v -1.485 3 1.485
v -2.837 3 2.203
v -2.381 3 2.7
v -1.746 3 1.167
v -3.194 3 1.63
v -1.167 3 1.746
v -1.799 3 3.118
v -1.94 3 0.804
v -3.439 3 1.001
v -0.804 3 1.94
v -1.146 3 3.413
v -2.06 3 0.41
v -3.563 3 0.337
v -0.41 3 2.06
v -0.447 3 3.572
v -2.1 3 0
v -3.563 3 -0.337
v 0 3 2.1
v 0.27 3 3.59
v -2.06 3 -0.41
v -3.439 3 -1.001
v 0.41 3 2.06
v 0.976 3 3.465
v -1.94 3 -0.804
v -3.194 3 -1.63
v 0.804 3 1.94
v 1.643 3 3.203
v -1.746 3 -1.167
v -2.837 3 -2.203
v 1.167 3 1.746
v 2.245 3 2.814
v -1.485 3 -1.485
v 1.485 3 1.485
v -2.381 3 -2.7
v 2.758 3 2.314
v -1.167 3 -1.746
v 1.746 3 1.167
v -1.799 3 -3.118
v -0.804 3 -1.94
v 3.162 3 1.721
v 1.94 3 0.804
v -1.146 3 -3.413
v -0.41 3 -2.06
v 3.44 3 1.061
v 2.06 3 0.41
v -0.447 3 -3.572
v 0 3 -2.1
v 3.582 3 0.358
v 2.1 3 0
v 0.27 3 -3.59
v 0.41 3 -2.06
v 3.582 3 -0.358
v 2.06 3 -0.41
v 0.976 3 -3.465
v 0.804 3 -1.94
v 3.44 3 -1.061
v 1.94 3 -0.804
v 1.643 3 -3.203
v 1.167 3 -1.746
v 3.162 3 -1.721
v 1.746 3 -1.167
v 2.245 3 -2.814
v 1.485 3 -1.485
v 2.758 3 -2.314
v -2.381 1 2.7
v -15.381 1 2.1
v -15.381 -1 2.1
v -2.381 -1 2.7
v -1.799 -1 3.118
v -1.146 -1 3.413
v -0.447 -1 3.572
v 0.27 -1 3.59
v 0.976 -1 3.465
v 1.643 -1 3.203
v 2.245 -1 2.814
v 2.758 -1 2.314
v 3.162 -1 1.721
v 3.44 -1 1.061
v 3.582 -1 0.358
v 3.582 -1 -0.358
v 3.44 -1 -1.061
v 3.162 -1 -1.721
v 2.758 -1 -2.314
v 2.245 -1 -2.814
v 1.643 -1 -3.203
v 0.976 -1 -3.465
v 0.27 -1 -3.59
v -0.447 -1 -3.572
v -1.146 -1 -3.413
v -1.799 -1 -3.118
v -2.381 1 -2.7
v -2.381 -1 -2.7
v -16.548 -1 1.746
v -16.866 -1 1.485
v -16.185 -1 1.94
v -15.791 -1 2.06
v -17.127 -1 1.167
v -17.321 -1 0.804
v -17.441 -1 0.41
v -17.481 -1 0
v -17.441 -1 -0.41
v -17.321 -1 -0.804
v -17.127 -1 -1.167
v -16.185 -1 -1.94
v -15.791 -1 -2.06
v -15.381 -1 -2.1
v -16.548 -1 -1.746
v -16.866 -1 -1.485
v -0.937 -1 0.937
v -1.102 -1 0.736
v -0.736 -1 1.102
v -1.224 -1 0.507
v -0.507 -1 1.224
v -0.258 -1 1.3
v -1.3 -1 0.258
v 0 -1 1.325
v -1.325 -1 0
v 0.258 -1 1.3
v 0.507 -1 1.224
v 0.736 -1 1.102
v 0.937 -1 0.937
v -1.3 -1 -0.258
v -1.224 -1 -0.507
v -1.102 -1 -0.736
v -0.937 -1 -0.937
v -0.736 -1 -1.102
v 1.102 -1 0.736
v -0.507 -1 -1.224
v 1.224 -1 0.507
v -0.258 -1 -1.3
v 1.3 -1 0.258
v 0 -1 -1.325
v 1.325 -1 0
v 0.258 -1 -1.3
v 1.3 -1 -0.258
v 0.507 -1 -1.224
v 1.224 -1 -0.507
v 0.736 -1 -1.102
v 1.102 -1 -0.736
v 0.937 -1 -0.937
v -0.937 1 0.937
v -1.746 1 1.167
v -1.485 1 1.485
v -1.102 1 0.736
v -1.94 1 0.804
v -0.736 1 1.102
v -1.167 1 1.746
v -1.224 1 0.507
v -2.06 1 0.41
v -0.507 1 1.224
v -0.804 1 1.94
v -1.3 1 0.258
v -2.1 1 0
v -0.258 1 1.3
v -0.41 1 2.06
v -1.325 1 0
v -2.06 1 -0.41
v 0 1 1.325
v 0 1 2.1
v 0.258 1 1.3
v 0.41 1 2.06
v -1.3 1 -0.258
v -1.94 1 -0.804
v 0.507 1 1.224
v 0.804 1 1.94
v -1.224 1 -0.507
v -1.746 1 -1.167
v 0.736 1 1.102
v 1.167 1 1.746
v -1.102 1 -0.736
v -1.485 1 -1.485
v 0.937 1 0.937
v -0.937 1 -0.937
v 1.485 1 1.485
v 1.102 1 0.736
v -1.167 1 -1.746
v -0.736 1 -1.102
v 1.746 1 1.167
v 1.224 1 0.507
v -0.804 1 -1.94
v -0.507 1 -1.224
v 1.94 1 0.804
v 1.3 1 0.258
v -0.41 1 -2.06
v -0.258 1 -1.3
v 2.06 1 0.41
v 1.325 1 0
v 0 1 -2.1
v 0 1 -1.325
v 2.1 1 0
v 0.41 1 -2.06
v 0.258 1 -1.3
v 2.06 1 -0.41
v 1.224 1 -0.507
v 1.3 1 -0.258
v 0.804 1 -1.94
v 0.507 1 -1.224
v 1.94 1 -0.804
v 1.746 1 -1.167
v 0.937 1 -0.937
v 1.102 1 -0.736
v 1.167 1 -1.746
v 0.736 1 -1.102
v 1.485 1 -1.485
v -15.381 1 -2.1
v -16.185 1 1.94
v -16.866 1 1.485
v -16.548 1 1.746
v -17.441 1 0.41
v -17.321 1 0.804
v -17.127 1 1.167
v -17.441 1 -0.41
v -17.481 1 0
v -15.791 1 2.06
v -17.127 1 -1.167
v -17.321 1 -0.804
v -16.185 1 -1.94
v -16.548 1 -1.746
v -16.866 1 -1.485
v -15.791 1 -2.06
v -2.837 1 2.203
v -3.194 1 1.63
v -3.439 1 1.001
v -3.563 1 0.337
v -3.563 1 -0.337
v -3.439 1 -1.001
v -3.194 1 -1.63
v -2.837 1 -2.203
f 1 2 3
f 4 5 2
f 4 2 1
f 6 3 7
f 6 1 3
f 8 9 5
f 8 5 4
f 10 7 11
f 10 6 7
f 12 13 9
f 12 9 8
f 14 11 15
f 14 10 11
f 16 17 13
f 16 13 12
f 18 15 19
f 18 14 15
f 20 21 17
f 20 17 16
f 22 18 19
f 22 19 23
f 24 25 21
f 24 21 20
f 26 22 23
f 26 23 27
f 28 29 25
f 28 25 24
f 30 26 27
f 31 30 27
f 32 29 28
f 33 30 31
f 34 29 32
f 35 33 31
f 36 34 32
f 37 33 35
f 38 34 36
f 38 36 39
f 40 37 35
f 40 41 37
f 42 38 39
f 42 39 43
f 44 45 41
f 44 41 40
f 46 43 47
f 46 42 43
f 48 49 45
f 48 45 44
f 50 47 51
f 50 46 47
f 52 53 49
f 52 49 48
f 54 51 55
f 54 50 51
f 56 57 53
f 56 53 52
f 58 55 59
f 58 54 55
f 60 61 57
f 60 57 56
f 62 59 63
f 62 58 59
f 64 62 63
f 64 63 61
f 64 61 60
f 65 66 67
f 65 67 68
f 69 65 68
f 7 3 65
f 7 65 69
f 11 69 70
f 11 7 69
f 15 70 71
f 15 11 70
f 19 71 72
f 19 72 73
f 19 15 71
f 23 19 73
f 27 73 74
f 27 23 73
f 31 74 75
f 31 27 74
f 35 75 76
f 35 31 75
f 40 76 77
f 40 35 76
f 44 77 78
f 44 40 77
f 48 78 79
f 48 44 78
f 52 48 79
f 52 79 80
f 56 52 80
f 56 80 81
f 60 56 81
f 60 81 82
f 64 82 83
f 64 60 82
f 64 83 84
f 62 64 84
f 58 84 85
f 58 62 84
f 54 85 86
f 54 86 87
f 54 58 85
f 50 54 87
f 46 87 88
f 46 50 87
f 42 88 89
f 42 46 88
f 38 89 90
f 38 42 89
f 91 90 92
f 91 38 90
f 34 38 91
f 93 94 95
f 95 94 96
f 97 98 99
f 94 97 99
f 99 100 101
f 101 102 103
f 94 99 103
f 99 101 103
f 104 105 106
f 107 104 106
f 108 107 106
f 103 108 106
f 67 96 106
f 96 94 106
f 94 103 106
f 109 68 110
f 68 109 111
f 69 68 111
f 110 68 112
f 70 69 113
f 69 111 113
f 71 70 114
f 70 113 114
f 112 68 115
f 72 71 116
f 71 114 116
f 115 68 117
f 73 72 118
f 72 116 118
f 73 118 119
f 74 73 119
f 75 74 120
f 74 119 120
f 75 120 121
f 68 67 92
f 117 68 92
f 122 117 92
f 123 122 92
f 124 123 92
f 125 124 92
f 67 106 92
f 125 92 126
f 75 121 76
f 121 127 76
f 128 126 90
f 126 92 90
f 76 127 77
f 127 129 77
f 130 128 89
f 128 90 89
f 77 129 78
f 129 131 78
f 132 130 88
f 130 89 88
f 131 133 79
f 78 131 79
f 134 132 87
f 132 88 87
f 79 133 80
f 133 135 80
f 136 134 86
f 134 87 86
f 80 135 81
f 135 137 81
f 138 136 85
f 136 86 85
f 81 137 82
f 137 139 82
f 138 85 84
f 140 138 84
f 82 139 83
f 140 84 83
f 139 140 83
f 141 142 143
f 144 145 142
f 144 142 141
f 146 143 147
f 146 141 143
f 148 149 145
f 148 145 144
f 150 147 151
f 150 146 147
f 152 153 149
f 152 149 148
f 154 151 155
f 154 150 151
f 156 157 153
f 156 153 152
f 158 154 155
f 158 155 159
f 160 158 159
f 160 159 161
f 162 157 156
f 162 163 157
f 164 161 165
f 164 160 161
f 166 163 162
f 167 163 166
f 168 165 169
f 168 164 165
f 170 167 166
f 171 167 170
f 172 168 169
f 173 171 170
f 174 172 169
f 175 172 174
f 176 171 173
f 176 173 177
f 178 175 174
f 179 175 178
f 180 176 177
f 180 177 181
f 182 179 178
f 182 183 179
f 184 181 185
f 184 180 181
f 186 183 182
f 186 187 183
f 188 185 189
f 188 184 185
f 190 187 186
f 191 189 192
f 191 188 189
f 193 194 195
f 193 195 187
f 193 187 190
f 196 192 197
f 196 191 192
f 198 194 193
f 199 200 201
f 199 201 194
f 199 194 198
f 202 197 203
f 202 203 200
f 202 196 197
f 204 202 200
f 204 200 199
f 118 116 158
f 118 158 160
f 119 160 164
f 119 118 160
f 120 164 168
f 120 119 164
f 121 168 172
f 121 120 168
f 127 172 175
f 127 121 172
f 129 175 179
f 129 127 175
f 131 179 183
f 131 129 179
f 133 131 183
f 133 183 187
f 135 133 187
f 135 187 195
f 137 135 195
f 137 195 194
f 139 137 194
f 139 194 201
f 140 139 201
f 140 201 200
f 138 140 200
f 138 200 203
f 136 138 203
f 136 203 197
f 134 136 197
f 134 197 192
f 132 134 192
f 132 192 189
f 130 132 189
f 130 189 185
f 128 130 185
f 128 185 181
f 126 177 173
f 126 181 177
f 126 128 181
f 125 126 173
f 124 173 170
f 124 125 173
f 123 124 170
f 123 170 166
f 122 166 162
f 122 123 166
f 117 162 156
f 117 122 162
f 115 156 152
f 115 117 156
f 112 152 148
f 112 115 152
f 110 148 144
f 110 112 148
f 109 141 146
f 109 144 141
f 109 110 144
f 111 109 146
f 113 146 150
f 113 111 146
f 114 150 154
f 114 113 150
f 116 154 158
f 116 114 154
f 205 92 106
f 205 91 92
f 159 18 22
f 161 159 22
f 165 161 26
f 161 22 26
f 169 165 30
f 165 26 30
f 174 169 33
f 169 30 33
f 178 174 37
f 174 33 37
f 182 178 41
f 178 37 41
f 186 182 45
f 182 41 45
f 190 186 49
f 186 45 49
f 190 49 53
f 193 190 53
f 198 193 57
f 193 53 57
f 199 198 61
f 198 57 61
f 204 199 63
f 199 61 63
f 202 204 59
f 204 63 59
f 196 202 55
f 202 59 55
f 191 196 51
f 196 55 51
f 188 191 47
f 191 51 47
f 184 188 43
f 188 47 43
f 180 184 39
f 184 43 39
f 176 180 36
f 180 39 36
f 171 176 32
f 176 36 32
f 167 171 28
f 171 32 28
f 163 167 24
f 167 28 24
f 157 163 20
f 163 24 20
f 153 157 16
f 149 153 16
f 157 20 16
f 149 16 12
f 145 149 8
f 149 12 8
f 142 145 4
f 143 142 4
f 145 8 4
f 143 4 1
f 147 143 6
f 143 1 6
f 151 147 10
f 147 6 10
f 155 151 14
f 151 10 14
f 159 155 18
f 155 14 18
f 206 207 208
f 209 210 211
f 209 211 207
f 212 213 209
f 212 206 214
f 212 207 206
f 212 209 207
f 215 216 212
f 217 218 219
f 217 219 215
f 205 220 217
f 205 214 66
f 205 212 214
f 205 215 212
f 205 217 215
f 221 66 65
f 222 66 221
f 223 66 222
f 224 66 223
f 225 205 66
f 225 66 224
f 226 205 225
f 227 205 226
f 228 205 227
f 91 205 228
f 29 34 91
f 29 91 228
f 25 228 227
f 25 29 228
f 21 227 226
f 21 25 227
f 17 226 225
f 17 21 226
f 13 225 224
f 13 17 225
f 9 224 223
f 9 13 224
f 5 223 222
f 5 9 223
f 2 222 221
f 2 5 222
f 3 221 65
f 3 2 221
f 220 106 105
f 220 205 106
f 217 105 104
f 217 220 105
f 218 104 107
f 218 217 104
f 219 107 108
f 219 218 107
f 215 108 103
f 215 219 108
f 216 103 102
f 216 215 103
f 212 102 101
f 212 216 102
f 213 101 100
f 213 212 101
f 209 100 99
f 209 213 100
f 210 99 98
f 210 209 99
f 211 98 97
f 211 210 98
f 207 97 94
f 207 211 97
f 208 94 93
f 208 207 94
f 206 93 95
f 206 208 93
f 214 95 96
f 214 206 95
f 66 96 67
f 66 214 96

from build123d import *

# Parameters (mm, degrees)
BOSS_EXTRUDE1_DEPTH     = 1
BOSS_EXTRUDE3_START     = 2
SKETCH2_R               = 2.1
BOSS_EXTRUDE3_DEPTH     = 2
CUT_EXTRUDE1_DEPTH      = 18.959719392
CUT_EXTRUDE1_DEPTH_BACK = 18.959719392
SKETCH3_R               = 1.325


with BuildPart() as part:
    # Sketch1 → Boss-Extrude1 (new, symmetric)
    with BuildSketch(Plane(origin=(0, 0, 0), x_dir=(1, 0, 0), z_dir=(0, 1, 0))):
        with BuildLine():
            ThreePointArc((-15.38117618, 2.1), (-17.48117618, 0), (-15.38117618, -2.1))
            Line((-15.38117618, -2.1), (-2.38117618, -2.7))
            ThreePointArc((-2.38117618, -2.7), (3.6, 0), (-2.38117618, 2.7))
            Line((-2.38117618, 2.7), (-15.38117618, 2.1))
        make_face()
    extrude(amount=BOSS_EXTRUDE1_DEPTH, both=True)

    # Sketch2 → Boss-Extrude3 (add)
    with BuildSketch(Plane(origin=(0, 1, 0), x_dir=(1, 0, 0), z_dir=(0, 1, 0)).offset(BOSS_EXTRUDE3_START)):
        with BuildLine():
            ThreePointArc((-2.38117618, 2.7), (-3.579161976, 0), (-2.38117618, -2.7))
            ThreePointArc((-2.38117618, -2.7), (3.6, 0), (-2.38117618, 2.7))
        make_face()
        with Locations(Location((0, 0, 0), (0, 0, 270))):
            Circle(SKETCH2_R, mode=Mode.SUBTRACT)
    extrude(amount=-BOSS_EXTRUDE3_DEPTH)

    # Sketch3 → Cut-Extrude1 (cut, two sides: drawn at the far end of the back side and taken through both)
    with BuildSketch(Plane(origin=(0, 1, 0), x_dir=(1, 0, 0), z_dir=(0, 1, 0)).offset(-CUT_EXTRUDE1_DEPTH_BACK)):
        with Locations(Location((0, 0, 0), (0, 0, 270))):
            Circle(SKETCH3_R)
    extrude(amount=CUT_EXTRUDE1_DEPTH + CUT_EXTRUDE1_DEPTH_BACK, mode=Mode.SUBTRACT)


solid = part.part
